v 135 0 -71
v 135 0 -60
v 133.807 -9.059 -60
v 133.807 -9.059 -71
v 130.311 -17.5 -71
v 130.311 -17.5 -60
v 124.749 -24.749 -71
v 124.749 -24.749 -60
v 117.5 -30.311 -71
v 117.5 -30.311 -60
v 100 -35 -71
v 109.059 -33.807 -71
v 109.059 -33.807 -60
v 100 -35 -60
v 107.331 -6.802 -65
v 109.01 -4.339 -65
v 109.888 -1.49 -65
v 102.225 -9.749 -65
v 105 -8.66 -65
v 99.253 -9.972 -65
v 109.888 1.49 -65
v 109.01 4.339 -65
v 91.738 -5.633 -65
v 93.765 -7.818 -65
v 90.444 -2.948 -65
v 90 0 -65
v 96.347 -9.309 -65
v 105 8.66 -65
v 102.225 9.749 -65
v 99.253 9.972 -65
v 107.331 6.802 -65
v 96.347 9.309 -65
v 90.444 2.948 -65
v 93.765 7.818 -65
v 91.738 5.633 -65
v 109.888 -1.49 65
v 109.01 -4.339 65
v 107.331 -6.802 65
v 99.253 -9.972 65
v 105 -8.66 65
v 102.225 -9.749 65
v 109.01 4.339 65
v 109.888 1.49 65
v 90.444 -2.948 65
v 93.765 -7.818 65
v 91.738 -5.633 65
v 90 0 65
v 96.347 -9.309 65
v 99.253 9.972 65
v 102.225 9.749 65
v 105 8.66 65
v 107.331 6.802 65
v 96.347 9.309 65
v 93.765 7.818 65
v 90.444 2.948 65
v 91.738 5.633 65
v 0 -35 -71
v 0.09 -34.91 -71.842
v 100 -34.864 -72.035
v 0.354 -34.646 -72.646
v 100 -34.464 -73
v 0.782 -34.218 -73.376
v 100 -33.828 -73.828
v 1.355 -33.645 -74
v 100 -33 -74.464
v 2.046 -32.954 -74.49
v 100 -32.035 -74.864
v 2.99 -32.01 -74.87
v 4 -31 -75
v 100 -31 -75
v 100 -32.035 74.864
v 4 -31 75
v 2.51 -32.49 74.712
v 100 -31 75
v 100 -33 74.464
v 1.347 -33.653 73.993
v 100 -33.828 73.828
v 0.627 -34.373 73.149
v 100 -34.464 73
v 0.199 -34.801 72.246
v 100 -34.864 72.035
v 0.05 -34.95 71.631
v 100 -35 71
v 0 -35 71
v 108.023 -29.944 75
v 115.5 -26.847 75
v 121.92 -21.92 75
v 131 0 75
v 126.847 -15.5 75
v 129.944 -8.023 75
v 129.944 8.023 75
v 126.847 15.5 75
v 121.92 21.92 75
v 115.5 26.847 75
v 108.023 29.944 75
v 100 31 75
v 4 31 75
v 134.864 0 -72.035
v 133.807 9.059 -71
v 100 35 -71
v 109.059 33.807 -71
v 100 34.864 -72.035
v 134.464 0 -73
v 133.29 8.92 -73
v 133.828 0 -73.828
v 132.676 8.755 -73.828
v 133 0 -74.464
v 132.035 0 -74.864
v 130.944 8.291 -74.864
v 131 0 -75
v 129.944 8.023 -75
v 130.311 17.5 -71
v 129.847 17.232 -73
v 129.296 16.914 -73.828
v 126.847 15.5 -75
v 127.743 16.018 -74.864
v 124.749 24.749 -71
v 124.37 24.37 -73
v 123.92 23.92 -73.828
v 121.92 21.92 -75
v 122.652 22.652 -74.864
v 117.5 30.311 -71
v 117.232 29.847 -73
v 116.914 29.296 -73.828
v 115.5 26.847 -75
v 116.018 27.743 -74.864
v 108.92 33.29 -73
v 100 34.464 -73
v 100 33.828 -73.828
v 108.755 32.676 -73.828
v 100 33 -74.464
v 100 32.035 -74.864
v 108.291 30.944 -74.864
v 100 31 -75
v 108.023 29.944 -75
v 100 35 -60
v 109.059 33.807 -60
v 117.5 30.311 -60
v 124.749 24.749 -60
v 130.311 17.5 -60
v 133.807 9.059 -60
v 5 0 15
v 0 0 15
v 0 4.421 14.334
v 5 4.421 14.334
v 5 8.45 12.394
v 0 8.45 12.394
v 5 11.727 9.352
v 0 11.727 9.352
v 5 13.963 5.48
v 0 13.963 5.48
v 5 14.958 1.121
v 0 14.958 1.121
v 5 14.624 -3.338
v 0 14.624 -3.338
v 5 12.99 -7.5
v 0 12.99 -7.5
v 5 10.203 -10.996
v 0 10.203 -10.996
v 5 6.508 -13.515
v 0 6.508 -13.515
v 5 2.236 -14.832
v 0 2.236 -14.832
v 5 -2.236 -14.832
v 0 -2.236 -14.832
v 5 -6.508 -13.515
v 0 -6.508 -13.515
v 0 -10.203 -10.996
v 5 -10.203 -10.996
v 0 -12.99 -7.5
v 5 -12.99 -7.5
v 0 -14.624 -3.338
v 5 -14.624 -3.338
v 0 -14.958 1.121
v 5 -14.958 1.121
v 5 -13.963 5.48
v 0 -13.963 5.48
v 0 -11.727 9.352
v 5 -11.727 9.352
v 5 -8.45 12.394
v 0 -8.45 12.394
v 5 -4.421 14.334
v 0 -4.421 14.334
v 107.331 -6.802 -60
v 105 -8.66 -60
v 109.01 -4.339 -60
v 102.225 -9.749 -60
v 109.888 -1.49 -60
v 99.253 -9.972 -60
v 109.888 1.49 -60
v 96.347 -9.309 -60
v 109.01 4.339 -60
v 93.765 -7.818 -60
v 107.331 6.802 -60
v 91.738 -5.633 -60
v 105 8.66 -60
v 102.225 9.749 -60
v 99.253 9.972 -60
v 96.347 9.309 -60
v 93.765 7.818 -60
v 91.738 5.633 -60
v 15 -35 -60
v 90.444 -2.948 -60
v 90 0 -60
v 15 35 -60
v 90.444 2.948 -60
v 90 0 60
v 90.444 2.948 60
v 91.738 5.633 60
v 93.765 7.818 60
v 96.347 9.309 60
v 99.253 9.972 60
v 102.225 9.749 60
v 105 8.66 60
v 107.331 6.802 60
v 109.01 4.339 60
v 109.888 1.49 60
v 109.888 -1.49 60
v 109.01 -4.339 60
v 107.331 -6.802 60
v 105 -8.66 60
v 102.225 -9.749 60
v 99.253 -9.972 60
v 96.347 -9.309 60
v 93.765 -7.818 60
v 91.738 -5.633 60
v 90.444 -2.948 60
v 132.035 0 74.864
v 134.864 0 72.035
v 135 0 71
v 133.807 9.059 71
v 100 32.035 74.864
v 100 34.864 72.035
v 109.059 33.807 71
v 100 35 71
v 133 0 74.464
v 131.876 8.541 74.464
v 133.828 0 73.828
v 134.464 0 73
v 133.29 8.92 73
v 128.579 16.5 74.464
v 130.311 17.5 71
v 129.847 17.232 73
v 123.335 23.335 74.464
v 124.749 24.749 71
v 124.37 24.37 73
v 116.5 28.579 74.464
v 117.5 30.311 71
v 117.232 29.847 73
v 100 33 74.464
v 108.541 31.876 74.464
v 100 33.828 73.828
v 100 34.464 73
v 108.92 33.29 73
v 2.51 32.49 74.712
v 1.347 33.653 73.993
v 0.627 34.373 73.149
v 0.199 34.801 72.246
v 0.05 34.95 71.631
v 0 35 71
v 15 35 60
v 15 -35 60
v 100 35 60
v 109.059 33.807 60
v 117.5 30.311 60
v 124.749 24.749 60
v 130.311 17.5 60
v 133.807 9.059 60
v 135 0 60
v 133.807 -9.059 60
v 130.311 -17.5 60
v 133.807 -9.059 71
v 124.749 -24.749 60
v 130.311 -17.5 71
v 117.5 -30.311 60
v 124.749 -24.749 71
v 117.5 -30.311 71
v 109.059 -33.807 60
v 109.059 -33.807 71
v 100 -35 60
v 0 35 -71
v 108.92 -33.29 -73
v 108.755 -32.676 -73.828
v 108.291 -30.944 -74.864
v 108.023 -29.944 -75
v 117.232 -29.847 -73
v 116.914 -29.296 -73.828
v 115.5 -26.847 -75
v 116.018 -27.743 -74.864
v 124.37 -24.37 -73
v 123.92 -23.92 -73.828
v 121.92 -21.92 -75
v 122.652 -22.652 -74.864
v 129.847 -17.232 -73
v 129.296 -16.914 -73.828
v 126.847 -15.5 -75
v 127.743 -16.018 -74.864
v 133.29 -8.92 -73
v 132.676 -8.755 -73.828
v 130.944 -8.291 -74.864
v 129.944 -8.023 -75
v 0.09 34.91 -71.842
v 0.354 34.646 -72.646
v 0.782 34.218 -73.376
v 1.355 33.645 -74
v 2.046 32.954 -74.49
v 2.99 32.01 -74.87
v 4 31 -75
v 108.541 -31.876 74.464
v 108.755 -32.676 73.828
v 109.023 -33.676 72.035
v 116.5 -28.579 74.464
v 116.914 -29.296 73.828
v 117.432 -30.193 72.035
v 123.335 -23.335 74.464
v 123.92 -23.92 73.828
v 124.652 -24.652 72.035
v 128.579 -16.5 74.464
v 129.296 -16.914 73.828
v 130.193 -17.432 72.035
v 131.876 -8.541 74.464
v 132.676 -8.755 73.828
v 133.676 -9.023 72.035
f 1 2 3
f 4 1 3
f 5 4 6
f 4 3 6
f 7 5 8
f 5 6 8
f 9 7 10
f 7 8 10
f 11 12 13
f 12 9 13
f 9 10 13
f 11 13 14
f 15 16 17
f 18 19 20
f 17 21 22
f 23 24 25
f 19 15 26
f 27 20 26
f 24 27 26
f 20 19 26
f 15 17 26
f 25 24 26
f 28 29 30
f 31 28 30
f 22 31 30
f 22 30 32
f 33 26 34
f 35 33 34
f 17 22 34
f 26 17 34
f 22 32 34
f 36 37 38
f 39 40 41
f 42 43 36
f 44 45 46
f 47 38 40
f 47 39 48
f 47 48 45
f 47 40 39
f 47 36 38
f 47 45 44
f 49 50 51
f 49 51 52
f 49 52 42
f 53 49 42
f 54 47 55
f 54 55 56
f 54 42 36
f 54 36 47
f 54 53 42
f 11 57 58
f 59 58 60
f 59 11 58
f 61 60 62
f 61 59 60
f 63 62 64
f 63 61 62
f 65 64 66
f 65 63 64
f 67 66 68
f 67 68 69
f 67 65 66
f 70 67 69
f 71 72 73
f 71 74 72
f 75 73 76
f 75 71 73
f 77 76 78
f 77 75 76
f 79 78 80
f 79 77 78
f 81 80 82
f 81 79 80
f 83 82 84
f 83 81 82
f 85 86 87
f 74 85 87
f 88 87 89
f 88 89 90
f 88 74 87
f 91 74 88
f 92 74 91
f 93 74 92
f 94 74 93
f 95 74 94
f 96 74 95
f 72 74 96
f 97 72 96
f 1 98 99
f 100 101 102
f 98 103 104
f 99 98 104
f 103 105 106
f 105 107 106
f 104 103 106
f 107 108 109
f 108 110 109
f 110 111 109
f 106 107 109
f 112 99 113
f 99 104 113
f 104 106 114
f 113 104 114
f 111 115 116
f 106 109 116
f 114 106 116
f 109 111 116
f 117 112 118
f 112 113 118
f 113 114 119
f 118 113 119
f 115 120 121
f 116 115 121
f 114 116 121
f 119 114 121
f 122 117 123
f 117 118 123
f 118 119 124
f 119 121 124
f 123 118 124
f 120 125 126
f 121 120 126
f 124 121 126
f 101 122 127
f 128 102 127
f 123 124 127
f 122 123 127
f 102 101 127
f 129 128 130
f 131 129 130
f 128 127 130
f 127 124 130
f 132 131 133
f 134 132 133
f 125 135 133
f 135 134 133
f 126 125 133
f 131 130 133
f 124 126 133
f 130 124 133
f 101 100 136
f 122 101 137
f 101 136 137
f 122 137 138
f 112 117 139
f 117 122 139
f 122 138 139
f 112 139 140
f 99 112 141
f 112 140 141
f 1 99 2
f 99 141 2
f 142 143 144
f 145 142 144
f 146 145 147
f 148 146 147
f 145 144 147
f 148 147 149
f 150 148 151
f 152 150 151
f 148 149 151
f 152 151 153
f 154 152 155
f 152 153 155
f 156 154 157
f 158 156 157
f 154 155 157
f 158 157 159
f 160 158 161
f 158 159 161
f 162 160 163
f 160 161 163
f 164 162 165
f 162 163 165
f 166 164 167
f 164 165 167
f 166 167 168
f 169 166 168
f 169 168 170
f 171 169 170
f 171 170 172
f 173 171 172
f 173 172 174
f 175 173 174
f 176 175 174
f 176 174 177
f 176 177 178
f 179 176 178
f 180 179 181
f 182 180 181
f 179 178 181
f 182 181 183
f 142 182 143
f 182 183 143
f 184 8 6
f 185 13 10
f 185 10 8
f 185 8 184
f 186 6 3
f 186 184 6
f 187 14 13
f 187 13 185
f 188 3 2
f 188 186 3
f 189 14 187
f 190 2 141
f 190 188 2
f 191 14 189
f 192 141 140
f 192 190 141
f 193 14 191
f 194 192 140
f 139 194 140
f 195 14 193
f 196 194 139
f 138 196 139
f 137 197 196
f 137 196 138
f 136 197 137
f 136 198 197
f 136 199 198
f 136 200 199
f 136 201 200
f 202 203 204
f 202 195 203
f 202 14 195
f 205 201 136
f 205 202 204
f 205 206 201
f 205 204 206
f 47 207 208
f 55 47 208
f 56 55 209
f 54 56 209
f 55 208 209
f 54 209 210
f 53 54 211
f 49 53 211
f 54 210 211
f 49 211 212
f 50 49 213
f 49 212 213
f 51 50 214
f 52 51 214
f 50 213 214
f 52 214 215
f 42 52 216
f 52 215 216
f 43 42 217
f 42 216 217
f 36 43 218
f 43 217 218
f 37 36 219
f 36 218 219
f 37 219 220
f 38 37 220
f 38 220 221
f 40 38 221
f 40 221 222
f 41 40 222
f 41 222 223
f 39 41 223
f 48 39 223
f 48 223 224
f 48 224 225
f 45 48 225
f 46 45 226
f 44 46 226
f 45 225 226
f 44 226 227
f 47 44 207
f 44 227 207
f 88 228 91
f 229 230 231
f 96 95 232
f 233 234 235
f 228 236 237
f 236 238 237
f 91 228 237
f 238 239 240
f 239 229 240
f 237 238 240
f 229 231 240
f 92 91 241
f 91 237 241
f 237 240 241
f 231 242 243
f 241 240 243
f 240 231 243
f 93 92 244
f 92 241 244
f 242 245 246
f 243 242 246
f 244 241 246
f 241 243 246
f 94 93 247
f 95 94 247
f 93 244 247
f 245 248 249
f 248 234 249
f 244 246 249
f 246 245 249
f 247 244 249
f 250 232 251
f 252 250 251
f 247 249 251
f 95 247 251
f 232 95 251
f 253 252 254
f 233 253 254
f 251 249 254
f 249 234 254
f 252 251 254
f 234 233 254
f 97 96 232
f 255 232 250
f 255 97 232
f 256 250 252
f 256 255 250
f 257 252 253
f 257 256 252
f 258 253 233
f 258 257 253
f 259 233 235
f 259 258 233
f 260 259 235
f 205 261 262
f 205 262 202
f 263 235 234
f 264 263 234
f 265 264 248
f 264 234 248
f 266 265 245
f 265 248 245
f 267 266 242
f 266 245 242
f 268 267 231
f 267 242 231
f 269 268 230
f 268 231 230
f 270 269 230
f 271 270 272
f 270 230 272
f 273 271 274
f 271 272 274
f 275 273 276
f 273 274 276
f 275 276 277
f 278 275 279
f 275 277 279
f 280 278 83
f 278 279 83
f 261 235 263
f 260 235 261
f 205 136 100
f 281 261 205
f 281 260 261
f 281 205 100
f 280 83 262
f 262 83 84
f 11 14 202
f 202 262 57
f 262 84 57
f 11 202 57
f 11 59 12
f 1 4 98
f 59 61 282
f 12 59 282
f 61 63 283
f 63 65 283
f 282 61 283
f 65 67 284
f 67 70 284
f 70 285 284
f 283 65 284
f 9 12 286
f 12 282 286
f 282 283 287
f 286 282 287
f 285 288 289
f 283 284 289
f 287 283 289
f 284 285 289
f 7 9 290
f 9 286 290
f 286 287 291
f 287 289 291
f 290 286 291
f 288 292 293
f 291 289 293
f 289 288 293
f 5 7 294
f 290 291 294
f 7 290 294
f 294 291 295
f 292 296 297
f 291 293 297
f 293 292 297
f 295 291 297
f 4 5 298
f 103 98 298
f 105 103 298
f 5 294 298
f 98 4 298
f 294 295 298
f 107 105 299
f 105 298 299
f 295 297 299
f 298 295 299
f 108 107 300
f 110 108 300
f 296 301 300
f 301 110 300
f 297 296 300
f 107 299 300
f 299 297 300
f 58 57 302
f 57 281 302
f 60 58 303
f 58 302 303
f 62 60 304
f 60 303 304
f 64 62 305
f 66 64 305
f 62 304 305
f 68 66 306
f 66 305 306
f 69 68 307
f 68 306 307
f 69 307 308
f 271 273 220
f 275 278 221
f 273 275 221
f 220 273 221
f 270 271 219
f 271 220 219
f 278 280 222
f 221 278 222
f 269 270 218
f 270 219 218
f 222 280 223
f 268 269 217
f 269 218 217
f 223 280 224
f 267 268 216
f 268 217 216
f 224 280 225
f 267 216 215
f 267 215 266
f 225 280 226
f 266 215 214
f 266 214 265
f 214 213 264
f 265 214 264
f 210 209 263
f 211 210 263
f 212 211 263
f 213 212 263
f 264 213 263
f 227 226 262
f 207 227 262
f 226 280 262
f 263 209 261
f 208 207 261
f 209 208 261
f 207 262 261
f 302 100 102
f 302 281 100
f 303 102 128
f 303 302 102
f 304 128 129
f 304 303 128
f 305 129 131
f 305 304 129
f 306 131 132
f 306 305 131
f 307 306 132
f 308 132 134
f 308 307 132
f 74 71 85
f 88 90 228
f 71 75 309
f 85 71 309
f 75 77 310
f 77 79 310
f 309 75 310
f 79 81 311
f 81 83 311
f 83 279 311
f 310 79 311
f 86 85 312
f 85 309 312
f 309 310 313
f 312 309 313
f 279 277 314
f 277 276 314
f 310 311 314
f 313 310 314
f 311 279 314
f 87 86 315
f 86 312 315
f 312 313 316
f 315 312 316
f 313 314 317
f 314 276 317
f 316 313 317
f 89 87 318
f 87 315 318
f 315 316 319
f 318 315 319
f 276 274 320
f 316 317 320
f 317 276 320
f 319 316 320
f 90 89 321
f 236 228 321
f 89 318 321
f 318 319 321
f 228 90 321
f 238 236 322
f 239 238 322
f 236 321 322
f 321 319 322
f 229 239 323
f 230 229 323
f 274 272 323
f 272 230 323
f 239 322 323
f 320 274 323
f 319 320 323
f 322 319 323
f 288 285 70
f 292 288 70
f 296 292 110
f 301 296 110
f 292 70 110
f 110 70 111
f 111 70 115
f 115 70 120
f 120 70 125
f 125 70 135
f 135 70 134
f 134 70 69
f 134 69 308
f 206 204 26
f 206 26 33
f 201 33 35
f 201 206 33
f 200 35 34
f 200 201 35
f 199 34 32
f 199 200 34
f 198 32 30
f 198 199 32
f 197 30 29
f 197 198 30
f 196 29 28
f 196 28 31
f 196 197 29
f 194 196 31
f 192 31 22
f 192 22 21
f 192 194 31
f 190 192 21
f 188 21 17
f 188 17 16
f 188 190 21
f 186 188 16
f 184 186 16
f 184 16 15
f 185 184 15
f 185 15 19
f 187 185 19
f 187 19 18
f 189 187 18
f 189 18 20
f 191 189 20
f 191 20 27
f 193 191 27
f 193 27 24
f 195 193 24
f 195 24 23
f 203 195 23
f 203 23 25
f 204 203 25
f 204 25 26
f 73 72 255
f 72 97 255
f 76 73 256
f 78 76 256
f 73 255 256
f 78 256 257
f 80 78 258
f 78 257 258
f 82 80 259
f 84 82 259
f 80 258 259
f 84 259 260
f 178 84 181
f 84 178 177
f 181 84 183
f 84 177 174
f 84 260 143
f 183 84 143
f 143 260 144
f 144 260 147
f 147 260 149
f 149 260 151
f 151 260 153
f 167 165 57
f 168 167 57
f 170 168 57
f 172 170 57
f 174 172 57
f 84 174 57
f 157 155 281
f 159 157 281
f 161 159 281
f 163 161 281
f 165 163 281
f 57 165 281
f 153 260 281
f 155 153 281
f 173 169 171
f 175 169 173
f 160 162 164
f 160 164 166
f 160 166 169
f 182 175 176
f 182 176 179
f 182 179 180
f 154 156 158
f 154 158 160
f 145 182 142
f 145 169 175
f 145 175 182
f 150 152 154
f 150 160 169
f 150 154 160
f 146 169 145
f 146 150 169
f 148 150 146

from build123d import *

# Parameters (mm, degrees)
SKETCH1_W               = 150
SKETCH1_H               = 70
BOSS_EXTRUDE1_DEPTH     = 15
SKETCH2_W               = 15
SKETCH2_H               = 70
BOSS_EXTRUDE2_DEPTH     = 120
CUT_EXTRUDE1_DEPTH      = 151
SKETCH5_R               = 10
CUT_EXTRUDE2_DEPTH      = 125
CUT_EXTRUDE2_DEPTH_BACK = 5
FILLET1_R               = 4
SKETCH6_R               = 15
CUT_EXTRUDE3_DEPTH      = 5


with BuildPart() as part:
    # Sketch1 → Boss-Extrude1 (new body)
    with BuildSketch(Plane(origin=(0, 0, 0), x_dir=(0, 0, -1), z_dir=(1, 0, 0))):
        Rectangle(SKETCH1_W, SKETCH1_H)
    extrude(amount=BOSS_EXTRUDE1_DEPTH)

    # Sketch2 → Boss-Extrude2 (add)
    with BuildSketch(Plane(origin=(15, 0, 0), x_dir=(0, 0, -1), z_dir=(1, 0, 0))):
        with Locations((-67.5, 0)):
            Rectangle(SKETCH2_W, SKETCH2_H)
        with Locations((67.5, 0)):
            Rectangle(SKETCH2_W, SKETCH2_H)
    extrude(amount=BOSS_EXTRUDE2_DEPTH)

    # Sketch3 → Cut-Extrude1 (cut, through all)
    with BuildSketch(Plane.XY.offset(75)):
        with BuildLine():
            ThreePointArc((99.999999969, 35), (124.748737331, 24.748737352), (135, 0))
            Line((135, 0), (135, 35))
            Line((135, 35), (99.999999969, 35))
        make_face()
        with BuildLine():
            Line((100, -35), (135, -35))
            Line((135, -35), (135, 0))
            ThreePointArc((135, 0), (124.748737342, -24.748737342), (100, -35))
        make_face()
    extrude(amount=-CUT_EXTRUDE1_DEPTH, mode=Mode.SUBTRACT)

    # Sketch5 → Cut-Extrude2 (cut, two sides)
    with BuildSketch(Plane(origin=(0, 0, 60), x_dir=(-1, 0, 0), z_dir=(0, 0, -1))) as cut_extrude2_sk:
        with Locations((-100, 0)):
            Circle(SKETCH5_R)
    extrude(amount=CUT_EXTRUDE2_DEPTH, mode=Mode.SUBTRACT)
    extrude(cut_extrude2_sk.sketch, amount=-CUT_EXTRUDE2_DEPTH_BACK, mode=Mode.SUBTRACT)

    # Fillet1
    fillet1_edges = [part.edges().sort_by_distance(p)[0] for p in [
        (49.999999985, 35, 75),
        (49.999999985, 35, -75),
        (135, 1.5e-08, 75),
        (135, 1.5e-08, -75),
        (0, 0, 75),
        (50, -35, -75),
        (50, -35, 75),
        (0, 0, -75),
    ]]
    fillet(fillet1_edges, radius=FILLET1_R)

    # Sketch6 → Cut-Extrude3 (cut)
    with BuildSketch(Plane.ZY):
        Circle(SKETCH6_R)
    extrude(amount=-CUT_EXTRUDE3_DEPTH, mode=Mode.SUBTRACT)


solid = part.part
